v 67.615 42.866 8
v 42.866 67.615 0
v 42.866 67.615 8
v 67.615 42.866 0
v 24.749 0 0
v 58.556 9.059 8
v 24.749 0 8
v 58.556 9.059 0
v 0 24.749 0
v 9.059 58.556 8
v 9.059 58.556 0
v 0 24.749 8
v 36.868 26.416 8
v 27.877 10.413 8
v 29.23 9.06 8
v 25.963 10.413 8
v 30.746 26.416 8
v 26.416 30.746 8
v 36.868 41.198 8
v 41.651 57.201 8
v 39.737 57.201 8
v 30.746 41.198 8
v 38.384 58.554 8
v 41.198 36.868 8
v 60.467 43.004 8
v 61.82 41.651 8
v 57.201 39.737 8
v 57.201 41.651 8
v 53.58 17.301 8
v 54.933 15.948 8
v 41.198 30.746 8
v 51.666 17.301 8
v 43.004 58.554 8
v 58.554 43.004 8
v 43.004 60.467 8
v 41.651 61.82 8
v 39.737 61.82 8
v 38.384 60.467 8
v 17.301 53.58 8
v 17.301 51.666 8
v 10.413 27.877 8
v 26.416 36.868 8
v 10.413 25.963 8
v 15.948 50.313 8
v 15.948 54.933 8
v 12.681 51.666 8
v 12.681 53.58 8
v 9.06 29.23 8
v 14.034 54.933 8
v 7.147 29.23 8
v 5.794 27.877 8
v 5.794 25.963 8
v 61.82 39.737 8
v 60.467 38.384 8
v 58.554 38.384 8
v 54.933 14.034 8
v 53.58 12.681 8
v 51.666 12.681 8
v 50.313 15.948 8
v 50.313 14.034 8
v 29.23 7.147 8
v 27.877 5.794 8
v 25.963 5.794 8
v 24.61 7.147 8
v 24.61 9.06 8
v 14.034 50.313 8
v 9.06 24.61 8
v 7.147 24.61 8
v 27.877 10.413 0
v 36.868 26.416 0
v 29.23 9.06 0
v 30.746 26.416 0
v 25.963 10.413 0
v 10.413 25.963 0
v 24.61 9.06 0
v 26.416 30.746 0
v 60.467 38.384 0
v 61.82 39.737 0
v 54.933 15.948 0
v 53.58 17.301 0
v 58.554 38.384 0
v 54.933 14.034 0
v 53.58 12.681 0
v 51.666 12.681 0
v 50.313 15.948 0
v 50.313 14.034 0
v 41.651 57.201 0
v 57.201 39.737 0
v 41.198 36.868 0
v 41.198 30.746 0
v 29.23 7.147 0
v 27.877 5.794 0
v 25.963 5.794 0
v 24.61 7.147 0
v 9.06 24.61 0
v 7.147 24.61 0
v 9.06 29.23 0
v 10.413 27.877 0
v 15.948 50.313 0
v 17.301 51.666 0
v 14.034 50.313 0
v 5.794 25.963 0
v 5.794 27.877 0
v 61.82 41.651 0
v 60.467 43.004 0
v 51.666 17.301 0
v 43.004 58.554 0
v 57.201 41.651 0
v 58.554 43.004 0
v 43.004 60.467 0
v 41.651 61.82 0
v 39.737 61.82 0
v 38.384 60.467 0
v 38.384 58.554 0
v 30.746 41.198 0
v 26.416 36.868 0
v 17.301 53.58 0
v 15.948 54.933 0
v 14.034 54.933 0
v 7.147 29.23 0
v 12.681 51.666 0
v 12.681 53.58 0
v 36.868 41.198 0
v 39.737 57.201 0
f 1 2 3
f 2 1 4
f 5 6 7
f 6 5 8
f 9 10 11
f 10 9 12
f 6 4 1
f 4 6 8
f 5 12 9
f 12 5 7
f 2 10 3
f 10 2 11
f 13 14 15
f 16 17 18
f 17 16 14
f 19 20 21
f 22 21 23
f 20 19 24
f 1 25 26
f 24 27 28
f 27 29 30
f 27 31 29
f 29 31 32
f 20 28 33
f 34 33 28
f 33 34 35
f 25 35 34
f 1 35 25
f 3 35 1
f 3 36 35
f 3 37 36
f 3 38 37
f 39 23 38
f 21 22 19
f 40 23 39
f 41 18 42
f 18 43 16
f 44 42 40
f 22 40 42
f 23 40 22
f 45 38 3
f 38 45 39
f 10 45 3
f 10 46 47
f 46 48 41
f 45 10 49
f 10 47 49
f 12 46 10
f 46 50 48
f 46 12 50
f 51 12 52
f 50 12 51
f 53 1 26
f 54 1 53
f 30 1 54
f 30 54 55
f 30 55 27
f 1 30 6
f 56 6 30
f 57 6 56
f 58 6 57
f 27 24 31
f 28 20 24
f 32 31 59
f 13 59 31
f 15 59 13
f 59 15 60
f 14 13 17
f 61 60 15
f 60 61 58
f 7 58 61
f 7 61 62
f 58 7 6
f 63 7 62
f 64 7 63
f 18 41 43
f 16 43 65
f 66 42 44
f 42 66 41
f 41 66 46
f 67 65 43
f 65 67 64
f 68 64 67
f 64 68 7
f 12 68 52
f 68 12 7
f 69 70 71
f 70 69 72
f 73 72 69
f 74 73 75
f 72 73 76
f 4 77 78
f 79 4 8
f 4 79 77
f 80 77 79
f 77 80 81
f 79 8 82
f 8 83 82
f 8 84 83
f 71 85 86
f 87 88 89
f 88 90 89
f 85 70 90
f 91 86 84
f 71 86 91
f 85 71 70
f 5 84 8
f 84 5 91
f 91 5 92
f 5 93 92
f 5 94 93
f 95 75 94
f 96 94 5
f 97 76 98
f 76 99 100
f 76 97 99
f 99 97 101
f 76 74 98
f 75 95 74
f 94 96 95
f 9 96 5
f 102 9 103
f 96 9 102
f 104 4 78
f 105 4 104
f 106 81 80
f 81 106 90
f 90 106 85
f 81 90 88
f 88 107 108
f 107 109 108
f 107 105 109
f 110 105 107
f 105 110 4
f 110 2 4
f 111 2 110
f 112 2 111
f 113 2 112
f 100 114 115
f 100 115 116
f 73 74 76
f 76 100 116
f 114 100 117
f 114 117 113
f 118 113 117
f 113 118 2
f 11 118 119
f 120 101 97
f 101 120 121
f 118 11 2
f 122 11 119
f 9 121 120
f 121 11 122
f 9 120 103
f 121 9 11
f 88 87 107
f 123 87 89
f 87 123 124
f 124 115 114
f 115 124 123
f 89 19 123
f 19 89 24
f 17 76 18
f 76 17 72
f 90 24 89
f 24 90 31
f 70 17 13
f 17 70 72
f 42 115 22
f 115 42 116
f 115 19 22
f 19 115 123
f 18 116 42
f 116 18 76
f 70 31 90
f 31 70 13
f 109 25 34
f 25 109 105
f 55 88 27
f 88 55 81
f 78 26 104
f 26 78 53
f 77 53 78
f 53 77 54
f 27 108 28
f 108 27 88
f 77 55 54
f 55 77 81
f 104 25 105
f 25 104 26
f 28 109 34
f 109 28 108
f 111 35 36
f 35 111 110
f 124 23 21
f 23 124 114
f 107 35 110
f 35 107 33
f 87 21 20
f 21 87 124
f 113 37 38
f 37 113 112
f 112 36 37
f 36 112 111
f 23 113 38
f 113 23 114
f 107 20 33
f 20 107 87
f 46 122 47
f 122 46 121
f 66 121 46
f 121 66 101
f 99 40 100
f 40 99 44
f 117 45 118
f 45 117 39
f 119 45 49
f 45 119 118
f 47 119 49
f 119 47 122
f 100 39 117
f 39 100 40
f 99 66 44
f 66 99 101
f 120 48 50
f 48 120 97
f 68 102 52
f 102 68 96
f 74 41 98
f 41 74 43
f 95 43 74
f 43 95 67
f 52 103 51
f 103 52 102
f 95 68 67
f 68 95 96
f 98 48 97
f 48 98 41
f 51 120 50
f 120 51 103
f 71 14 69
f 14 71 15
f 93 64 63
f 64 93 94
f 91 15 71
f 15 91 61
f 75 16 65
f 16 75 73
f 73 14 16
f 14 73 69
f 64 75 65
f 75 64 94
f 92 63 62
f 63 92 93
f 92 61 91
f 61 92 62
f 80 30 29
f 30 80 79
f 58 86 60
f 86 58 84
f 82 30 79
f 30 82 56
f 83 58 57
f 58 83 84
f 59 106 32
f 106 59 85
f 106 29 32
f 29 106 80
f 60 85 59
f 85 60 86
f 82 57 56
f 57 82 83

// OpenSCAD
$fn = 32;

// ----------------------------------------------------------------------
// Polygon plate: 6-gon R35, 6 bolt windows
// ----------------------------------------------------------------------

// --- parameters (mm) ---
sides = 6;                // number of polygon sides
plate_r = 35;             // circumscribed radius of the polygon
bore_r = 8;               // centre bore radius
bolts = 6;                // number of bolt windows
ring_r = 26.61;           // bolt-circle radius
bolt_r = 2.5;             // bolt window radius
plate_t = 8;              // plate thickness, Z (extrusion height)

plate_d = 2 * plate_r;  // circumscribed diameter
bore_d = 2 * bore_r;  // centre bore diameter
bolt_d = 2 * bolt_r;  // bolt window diameter
ring_d = 2 * ring_r;  // bolt-circle diameter

profile = [[67.615, 42.866], [42.866, 67.615], [9.059, 58.556], [0, 24.749], [24.749, 0], [58.556, 9.059]];  // primary outline, 6 points, counter clockwise
void_1 = [[41.198, 36.868], [36.868, 41.198], [30.746, 41.198], [26.416, 36.868], [26.416, 30.746], [30.746, 26.416], [36.868, 26.416], [41.198, 30.746]];  // centre bore, 8 points
void_2 = [[61.82, 41.651], [60.467, 43.004], [58.554, 43.004], [57.201, 41.651], [57.201, 39.737], [58.554, 38.384], [60.467, 38.384], [61.82, 39.737]];  // bolt window 1, 8 points
void_3 = [[43.004, 60.467], [41.651, 61.82], [39.737, 61.82], [38.384, 60.467], [38.384, 58.554], [39.737, 57.201], [41.651, 57.201], [43.004, 58.554]];  // bolt window 2, 8 points
void_4 = [[17.301, 53.58], [15.948, 54.933], [14.034, 54.933], [12.681, 53.58], [12.681, 51.666], [14.034, 50.313], [15.948, 50.313], [17.301, 51.666]];  // bolt window 3, 8 points
void_5 = [[10.413, 27.877], [9.06, 29.23], [7.147, 29.23], [5.794, 27.877], [5.794, 25.963], [7.147, 24.61], [9.06, 24.61], [10.413, 25.963]];  // bolt window 4, 8 points
void_6 = [[29.23, 9.06], [27.877, 10.413], [25.963, 10.413], [24.61, 9.06], [24.61, 7.147], [25.963, 5.794], [27.877, 5.794], [29.23, 7.147]];  // bolt window 5, 8 points
void_7 = [[54.933, 15.948], [53.58, 17.301], [51.666, 17.301], [50.313, 15.948], [50.313, 14.034], [51.666, 12.681], [53.58, 12.681], [54.933, 14.034]];  // bolt window 6, 8 points

// --- the one profile operation ---
difference() {
  linear_extrude(height = plate_t) polygon(points = profile);
  translate([0, 0, -1])
    linear_extrude(height = plate_t + 2) polygon(points = void_1);
  translate([0, 0, -1])
    linear_extrude(height = plate_t + 2) polygon(points = void_2);
  translate([0, 0, -1])
    linear_extrude(height = plate_t + 2) polygon(points = void_3);
  translate([0, 0, -1])
    linear_extrude(height = plate_t + 2) polygon(points = void_4);
  translate([0, 0, -1])
    linear_extrude(height = plate_t + 2) polygon(points = void_5);
  translate([0, 0, -1])
    linear_extrude(height = plate_t + 2) polygon(points = void_6);
  translate([0, 0, -1])
    linear_extrude(height = plate_t + 2) polygon(points = void_7);
}
